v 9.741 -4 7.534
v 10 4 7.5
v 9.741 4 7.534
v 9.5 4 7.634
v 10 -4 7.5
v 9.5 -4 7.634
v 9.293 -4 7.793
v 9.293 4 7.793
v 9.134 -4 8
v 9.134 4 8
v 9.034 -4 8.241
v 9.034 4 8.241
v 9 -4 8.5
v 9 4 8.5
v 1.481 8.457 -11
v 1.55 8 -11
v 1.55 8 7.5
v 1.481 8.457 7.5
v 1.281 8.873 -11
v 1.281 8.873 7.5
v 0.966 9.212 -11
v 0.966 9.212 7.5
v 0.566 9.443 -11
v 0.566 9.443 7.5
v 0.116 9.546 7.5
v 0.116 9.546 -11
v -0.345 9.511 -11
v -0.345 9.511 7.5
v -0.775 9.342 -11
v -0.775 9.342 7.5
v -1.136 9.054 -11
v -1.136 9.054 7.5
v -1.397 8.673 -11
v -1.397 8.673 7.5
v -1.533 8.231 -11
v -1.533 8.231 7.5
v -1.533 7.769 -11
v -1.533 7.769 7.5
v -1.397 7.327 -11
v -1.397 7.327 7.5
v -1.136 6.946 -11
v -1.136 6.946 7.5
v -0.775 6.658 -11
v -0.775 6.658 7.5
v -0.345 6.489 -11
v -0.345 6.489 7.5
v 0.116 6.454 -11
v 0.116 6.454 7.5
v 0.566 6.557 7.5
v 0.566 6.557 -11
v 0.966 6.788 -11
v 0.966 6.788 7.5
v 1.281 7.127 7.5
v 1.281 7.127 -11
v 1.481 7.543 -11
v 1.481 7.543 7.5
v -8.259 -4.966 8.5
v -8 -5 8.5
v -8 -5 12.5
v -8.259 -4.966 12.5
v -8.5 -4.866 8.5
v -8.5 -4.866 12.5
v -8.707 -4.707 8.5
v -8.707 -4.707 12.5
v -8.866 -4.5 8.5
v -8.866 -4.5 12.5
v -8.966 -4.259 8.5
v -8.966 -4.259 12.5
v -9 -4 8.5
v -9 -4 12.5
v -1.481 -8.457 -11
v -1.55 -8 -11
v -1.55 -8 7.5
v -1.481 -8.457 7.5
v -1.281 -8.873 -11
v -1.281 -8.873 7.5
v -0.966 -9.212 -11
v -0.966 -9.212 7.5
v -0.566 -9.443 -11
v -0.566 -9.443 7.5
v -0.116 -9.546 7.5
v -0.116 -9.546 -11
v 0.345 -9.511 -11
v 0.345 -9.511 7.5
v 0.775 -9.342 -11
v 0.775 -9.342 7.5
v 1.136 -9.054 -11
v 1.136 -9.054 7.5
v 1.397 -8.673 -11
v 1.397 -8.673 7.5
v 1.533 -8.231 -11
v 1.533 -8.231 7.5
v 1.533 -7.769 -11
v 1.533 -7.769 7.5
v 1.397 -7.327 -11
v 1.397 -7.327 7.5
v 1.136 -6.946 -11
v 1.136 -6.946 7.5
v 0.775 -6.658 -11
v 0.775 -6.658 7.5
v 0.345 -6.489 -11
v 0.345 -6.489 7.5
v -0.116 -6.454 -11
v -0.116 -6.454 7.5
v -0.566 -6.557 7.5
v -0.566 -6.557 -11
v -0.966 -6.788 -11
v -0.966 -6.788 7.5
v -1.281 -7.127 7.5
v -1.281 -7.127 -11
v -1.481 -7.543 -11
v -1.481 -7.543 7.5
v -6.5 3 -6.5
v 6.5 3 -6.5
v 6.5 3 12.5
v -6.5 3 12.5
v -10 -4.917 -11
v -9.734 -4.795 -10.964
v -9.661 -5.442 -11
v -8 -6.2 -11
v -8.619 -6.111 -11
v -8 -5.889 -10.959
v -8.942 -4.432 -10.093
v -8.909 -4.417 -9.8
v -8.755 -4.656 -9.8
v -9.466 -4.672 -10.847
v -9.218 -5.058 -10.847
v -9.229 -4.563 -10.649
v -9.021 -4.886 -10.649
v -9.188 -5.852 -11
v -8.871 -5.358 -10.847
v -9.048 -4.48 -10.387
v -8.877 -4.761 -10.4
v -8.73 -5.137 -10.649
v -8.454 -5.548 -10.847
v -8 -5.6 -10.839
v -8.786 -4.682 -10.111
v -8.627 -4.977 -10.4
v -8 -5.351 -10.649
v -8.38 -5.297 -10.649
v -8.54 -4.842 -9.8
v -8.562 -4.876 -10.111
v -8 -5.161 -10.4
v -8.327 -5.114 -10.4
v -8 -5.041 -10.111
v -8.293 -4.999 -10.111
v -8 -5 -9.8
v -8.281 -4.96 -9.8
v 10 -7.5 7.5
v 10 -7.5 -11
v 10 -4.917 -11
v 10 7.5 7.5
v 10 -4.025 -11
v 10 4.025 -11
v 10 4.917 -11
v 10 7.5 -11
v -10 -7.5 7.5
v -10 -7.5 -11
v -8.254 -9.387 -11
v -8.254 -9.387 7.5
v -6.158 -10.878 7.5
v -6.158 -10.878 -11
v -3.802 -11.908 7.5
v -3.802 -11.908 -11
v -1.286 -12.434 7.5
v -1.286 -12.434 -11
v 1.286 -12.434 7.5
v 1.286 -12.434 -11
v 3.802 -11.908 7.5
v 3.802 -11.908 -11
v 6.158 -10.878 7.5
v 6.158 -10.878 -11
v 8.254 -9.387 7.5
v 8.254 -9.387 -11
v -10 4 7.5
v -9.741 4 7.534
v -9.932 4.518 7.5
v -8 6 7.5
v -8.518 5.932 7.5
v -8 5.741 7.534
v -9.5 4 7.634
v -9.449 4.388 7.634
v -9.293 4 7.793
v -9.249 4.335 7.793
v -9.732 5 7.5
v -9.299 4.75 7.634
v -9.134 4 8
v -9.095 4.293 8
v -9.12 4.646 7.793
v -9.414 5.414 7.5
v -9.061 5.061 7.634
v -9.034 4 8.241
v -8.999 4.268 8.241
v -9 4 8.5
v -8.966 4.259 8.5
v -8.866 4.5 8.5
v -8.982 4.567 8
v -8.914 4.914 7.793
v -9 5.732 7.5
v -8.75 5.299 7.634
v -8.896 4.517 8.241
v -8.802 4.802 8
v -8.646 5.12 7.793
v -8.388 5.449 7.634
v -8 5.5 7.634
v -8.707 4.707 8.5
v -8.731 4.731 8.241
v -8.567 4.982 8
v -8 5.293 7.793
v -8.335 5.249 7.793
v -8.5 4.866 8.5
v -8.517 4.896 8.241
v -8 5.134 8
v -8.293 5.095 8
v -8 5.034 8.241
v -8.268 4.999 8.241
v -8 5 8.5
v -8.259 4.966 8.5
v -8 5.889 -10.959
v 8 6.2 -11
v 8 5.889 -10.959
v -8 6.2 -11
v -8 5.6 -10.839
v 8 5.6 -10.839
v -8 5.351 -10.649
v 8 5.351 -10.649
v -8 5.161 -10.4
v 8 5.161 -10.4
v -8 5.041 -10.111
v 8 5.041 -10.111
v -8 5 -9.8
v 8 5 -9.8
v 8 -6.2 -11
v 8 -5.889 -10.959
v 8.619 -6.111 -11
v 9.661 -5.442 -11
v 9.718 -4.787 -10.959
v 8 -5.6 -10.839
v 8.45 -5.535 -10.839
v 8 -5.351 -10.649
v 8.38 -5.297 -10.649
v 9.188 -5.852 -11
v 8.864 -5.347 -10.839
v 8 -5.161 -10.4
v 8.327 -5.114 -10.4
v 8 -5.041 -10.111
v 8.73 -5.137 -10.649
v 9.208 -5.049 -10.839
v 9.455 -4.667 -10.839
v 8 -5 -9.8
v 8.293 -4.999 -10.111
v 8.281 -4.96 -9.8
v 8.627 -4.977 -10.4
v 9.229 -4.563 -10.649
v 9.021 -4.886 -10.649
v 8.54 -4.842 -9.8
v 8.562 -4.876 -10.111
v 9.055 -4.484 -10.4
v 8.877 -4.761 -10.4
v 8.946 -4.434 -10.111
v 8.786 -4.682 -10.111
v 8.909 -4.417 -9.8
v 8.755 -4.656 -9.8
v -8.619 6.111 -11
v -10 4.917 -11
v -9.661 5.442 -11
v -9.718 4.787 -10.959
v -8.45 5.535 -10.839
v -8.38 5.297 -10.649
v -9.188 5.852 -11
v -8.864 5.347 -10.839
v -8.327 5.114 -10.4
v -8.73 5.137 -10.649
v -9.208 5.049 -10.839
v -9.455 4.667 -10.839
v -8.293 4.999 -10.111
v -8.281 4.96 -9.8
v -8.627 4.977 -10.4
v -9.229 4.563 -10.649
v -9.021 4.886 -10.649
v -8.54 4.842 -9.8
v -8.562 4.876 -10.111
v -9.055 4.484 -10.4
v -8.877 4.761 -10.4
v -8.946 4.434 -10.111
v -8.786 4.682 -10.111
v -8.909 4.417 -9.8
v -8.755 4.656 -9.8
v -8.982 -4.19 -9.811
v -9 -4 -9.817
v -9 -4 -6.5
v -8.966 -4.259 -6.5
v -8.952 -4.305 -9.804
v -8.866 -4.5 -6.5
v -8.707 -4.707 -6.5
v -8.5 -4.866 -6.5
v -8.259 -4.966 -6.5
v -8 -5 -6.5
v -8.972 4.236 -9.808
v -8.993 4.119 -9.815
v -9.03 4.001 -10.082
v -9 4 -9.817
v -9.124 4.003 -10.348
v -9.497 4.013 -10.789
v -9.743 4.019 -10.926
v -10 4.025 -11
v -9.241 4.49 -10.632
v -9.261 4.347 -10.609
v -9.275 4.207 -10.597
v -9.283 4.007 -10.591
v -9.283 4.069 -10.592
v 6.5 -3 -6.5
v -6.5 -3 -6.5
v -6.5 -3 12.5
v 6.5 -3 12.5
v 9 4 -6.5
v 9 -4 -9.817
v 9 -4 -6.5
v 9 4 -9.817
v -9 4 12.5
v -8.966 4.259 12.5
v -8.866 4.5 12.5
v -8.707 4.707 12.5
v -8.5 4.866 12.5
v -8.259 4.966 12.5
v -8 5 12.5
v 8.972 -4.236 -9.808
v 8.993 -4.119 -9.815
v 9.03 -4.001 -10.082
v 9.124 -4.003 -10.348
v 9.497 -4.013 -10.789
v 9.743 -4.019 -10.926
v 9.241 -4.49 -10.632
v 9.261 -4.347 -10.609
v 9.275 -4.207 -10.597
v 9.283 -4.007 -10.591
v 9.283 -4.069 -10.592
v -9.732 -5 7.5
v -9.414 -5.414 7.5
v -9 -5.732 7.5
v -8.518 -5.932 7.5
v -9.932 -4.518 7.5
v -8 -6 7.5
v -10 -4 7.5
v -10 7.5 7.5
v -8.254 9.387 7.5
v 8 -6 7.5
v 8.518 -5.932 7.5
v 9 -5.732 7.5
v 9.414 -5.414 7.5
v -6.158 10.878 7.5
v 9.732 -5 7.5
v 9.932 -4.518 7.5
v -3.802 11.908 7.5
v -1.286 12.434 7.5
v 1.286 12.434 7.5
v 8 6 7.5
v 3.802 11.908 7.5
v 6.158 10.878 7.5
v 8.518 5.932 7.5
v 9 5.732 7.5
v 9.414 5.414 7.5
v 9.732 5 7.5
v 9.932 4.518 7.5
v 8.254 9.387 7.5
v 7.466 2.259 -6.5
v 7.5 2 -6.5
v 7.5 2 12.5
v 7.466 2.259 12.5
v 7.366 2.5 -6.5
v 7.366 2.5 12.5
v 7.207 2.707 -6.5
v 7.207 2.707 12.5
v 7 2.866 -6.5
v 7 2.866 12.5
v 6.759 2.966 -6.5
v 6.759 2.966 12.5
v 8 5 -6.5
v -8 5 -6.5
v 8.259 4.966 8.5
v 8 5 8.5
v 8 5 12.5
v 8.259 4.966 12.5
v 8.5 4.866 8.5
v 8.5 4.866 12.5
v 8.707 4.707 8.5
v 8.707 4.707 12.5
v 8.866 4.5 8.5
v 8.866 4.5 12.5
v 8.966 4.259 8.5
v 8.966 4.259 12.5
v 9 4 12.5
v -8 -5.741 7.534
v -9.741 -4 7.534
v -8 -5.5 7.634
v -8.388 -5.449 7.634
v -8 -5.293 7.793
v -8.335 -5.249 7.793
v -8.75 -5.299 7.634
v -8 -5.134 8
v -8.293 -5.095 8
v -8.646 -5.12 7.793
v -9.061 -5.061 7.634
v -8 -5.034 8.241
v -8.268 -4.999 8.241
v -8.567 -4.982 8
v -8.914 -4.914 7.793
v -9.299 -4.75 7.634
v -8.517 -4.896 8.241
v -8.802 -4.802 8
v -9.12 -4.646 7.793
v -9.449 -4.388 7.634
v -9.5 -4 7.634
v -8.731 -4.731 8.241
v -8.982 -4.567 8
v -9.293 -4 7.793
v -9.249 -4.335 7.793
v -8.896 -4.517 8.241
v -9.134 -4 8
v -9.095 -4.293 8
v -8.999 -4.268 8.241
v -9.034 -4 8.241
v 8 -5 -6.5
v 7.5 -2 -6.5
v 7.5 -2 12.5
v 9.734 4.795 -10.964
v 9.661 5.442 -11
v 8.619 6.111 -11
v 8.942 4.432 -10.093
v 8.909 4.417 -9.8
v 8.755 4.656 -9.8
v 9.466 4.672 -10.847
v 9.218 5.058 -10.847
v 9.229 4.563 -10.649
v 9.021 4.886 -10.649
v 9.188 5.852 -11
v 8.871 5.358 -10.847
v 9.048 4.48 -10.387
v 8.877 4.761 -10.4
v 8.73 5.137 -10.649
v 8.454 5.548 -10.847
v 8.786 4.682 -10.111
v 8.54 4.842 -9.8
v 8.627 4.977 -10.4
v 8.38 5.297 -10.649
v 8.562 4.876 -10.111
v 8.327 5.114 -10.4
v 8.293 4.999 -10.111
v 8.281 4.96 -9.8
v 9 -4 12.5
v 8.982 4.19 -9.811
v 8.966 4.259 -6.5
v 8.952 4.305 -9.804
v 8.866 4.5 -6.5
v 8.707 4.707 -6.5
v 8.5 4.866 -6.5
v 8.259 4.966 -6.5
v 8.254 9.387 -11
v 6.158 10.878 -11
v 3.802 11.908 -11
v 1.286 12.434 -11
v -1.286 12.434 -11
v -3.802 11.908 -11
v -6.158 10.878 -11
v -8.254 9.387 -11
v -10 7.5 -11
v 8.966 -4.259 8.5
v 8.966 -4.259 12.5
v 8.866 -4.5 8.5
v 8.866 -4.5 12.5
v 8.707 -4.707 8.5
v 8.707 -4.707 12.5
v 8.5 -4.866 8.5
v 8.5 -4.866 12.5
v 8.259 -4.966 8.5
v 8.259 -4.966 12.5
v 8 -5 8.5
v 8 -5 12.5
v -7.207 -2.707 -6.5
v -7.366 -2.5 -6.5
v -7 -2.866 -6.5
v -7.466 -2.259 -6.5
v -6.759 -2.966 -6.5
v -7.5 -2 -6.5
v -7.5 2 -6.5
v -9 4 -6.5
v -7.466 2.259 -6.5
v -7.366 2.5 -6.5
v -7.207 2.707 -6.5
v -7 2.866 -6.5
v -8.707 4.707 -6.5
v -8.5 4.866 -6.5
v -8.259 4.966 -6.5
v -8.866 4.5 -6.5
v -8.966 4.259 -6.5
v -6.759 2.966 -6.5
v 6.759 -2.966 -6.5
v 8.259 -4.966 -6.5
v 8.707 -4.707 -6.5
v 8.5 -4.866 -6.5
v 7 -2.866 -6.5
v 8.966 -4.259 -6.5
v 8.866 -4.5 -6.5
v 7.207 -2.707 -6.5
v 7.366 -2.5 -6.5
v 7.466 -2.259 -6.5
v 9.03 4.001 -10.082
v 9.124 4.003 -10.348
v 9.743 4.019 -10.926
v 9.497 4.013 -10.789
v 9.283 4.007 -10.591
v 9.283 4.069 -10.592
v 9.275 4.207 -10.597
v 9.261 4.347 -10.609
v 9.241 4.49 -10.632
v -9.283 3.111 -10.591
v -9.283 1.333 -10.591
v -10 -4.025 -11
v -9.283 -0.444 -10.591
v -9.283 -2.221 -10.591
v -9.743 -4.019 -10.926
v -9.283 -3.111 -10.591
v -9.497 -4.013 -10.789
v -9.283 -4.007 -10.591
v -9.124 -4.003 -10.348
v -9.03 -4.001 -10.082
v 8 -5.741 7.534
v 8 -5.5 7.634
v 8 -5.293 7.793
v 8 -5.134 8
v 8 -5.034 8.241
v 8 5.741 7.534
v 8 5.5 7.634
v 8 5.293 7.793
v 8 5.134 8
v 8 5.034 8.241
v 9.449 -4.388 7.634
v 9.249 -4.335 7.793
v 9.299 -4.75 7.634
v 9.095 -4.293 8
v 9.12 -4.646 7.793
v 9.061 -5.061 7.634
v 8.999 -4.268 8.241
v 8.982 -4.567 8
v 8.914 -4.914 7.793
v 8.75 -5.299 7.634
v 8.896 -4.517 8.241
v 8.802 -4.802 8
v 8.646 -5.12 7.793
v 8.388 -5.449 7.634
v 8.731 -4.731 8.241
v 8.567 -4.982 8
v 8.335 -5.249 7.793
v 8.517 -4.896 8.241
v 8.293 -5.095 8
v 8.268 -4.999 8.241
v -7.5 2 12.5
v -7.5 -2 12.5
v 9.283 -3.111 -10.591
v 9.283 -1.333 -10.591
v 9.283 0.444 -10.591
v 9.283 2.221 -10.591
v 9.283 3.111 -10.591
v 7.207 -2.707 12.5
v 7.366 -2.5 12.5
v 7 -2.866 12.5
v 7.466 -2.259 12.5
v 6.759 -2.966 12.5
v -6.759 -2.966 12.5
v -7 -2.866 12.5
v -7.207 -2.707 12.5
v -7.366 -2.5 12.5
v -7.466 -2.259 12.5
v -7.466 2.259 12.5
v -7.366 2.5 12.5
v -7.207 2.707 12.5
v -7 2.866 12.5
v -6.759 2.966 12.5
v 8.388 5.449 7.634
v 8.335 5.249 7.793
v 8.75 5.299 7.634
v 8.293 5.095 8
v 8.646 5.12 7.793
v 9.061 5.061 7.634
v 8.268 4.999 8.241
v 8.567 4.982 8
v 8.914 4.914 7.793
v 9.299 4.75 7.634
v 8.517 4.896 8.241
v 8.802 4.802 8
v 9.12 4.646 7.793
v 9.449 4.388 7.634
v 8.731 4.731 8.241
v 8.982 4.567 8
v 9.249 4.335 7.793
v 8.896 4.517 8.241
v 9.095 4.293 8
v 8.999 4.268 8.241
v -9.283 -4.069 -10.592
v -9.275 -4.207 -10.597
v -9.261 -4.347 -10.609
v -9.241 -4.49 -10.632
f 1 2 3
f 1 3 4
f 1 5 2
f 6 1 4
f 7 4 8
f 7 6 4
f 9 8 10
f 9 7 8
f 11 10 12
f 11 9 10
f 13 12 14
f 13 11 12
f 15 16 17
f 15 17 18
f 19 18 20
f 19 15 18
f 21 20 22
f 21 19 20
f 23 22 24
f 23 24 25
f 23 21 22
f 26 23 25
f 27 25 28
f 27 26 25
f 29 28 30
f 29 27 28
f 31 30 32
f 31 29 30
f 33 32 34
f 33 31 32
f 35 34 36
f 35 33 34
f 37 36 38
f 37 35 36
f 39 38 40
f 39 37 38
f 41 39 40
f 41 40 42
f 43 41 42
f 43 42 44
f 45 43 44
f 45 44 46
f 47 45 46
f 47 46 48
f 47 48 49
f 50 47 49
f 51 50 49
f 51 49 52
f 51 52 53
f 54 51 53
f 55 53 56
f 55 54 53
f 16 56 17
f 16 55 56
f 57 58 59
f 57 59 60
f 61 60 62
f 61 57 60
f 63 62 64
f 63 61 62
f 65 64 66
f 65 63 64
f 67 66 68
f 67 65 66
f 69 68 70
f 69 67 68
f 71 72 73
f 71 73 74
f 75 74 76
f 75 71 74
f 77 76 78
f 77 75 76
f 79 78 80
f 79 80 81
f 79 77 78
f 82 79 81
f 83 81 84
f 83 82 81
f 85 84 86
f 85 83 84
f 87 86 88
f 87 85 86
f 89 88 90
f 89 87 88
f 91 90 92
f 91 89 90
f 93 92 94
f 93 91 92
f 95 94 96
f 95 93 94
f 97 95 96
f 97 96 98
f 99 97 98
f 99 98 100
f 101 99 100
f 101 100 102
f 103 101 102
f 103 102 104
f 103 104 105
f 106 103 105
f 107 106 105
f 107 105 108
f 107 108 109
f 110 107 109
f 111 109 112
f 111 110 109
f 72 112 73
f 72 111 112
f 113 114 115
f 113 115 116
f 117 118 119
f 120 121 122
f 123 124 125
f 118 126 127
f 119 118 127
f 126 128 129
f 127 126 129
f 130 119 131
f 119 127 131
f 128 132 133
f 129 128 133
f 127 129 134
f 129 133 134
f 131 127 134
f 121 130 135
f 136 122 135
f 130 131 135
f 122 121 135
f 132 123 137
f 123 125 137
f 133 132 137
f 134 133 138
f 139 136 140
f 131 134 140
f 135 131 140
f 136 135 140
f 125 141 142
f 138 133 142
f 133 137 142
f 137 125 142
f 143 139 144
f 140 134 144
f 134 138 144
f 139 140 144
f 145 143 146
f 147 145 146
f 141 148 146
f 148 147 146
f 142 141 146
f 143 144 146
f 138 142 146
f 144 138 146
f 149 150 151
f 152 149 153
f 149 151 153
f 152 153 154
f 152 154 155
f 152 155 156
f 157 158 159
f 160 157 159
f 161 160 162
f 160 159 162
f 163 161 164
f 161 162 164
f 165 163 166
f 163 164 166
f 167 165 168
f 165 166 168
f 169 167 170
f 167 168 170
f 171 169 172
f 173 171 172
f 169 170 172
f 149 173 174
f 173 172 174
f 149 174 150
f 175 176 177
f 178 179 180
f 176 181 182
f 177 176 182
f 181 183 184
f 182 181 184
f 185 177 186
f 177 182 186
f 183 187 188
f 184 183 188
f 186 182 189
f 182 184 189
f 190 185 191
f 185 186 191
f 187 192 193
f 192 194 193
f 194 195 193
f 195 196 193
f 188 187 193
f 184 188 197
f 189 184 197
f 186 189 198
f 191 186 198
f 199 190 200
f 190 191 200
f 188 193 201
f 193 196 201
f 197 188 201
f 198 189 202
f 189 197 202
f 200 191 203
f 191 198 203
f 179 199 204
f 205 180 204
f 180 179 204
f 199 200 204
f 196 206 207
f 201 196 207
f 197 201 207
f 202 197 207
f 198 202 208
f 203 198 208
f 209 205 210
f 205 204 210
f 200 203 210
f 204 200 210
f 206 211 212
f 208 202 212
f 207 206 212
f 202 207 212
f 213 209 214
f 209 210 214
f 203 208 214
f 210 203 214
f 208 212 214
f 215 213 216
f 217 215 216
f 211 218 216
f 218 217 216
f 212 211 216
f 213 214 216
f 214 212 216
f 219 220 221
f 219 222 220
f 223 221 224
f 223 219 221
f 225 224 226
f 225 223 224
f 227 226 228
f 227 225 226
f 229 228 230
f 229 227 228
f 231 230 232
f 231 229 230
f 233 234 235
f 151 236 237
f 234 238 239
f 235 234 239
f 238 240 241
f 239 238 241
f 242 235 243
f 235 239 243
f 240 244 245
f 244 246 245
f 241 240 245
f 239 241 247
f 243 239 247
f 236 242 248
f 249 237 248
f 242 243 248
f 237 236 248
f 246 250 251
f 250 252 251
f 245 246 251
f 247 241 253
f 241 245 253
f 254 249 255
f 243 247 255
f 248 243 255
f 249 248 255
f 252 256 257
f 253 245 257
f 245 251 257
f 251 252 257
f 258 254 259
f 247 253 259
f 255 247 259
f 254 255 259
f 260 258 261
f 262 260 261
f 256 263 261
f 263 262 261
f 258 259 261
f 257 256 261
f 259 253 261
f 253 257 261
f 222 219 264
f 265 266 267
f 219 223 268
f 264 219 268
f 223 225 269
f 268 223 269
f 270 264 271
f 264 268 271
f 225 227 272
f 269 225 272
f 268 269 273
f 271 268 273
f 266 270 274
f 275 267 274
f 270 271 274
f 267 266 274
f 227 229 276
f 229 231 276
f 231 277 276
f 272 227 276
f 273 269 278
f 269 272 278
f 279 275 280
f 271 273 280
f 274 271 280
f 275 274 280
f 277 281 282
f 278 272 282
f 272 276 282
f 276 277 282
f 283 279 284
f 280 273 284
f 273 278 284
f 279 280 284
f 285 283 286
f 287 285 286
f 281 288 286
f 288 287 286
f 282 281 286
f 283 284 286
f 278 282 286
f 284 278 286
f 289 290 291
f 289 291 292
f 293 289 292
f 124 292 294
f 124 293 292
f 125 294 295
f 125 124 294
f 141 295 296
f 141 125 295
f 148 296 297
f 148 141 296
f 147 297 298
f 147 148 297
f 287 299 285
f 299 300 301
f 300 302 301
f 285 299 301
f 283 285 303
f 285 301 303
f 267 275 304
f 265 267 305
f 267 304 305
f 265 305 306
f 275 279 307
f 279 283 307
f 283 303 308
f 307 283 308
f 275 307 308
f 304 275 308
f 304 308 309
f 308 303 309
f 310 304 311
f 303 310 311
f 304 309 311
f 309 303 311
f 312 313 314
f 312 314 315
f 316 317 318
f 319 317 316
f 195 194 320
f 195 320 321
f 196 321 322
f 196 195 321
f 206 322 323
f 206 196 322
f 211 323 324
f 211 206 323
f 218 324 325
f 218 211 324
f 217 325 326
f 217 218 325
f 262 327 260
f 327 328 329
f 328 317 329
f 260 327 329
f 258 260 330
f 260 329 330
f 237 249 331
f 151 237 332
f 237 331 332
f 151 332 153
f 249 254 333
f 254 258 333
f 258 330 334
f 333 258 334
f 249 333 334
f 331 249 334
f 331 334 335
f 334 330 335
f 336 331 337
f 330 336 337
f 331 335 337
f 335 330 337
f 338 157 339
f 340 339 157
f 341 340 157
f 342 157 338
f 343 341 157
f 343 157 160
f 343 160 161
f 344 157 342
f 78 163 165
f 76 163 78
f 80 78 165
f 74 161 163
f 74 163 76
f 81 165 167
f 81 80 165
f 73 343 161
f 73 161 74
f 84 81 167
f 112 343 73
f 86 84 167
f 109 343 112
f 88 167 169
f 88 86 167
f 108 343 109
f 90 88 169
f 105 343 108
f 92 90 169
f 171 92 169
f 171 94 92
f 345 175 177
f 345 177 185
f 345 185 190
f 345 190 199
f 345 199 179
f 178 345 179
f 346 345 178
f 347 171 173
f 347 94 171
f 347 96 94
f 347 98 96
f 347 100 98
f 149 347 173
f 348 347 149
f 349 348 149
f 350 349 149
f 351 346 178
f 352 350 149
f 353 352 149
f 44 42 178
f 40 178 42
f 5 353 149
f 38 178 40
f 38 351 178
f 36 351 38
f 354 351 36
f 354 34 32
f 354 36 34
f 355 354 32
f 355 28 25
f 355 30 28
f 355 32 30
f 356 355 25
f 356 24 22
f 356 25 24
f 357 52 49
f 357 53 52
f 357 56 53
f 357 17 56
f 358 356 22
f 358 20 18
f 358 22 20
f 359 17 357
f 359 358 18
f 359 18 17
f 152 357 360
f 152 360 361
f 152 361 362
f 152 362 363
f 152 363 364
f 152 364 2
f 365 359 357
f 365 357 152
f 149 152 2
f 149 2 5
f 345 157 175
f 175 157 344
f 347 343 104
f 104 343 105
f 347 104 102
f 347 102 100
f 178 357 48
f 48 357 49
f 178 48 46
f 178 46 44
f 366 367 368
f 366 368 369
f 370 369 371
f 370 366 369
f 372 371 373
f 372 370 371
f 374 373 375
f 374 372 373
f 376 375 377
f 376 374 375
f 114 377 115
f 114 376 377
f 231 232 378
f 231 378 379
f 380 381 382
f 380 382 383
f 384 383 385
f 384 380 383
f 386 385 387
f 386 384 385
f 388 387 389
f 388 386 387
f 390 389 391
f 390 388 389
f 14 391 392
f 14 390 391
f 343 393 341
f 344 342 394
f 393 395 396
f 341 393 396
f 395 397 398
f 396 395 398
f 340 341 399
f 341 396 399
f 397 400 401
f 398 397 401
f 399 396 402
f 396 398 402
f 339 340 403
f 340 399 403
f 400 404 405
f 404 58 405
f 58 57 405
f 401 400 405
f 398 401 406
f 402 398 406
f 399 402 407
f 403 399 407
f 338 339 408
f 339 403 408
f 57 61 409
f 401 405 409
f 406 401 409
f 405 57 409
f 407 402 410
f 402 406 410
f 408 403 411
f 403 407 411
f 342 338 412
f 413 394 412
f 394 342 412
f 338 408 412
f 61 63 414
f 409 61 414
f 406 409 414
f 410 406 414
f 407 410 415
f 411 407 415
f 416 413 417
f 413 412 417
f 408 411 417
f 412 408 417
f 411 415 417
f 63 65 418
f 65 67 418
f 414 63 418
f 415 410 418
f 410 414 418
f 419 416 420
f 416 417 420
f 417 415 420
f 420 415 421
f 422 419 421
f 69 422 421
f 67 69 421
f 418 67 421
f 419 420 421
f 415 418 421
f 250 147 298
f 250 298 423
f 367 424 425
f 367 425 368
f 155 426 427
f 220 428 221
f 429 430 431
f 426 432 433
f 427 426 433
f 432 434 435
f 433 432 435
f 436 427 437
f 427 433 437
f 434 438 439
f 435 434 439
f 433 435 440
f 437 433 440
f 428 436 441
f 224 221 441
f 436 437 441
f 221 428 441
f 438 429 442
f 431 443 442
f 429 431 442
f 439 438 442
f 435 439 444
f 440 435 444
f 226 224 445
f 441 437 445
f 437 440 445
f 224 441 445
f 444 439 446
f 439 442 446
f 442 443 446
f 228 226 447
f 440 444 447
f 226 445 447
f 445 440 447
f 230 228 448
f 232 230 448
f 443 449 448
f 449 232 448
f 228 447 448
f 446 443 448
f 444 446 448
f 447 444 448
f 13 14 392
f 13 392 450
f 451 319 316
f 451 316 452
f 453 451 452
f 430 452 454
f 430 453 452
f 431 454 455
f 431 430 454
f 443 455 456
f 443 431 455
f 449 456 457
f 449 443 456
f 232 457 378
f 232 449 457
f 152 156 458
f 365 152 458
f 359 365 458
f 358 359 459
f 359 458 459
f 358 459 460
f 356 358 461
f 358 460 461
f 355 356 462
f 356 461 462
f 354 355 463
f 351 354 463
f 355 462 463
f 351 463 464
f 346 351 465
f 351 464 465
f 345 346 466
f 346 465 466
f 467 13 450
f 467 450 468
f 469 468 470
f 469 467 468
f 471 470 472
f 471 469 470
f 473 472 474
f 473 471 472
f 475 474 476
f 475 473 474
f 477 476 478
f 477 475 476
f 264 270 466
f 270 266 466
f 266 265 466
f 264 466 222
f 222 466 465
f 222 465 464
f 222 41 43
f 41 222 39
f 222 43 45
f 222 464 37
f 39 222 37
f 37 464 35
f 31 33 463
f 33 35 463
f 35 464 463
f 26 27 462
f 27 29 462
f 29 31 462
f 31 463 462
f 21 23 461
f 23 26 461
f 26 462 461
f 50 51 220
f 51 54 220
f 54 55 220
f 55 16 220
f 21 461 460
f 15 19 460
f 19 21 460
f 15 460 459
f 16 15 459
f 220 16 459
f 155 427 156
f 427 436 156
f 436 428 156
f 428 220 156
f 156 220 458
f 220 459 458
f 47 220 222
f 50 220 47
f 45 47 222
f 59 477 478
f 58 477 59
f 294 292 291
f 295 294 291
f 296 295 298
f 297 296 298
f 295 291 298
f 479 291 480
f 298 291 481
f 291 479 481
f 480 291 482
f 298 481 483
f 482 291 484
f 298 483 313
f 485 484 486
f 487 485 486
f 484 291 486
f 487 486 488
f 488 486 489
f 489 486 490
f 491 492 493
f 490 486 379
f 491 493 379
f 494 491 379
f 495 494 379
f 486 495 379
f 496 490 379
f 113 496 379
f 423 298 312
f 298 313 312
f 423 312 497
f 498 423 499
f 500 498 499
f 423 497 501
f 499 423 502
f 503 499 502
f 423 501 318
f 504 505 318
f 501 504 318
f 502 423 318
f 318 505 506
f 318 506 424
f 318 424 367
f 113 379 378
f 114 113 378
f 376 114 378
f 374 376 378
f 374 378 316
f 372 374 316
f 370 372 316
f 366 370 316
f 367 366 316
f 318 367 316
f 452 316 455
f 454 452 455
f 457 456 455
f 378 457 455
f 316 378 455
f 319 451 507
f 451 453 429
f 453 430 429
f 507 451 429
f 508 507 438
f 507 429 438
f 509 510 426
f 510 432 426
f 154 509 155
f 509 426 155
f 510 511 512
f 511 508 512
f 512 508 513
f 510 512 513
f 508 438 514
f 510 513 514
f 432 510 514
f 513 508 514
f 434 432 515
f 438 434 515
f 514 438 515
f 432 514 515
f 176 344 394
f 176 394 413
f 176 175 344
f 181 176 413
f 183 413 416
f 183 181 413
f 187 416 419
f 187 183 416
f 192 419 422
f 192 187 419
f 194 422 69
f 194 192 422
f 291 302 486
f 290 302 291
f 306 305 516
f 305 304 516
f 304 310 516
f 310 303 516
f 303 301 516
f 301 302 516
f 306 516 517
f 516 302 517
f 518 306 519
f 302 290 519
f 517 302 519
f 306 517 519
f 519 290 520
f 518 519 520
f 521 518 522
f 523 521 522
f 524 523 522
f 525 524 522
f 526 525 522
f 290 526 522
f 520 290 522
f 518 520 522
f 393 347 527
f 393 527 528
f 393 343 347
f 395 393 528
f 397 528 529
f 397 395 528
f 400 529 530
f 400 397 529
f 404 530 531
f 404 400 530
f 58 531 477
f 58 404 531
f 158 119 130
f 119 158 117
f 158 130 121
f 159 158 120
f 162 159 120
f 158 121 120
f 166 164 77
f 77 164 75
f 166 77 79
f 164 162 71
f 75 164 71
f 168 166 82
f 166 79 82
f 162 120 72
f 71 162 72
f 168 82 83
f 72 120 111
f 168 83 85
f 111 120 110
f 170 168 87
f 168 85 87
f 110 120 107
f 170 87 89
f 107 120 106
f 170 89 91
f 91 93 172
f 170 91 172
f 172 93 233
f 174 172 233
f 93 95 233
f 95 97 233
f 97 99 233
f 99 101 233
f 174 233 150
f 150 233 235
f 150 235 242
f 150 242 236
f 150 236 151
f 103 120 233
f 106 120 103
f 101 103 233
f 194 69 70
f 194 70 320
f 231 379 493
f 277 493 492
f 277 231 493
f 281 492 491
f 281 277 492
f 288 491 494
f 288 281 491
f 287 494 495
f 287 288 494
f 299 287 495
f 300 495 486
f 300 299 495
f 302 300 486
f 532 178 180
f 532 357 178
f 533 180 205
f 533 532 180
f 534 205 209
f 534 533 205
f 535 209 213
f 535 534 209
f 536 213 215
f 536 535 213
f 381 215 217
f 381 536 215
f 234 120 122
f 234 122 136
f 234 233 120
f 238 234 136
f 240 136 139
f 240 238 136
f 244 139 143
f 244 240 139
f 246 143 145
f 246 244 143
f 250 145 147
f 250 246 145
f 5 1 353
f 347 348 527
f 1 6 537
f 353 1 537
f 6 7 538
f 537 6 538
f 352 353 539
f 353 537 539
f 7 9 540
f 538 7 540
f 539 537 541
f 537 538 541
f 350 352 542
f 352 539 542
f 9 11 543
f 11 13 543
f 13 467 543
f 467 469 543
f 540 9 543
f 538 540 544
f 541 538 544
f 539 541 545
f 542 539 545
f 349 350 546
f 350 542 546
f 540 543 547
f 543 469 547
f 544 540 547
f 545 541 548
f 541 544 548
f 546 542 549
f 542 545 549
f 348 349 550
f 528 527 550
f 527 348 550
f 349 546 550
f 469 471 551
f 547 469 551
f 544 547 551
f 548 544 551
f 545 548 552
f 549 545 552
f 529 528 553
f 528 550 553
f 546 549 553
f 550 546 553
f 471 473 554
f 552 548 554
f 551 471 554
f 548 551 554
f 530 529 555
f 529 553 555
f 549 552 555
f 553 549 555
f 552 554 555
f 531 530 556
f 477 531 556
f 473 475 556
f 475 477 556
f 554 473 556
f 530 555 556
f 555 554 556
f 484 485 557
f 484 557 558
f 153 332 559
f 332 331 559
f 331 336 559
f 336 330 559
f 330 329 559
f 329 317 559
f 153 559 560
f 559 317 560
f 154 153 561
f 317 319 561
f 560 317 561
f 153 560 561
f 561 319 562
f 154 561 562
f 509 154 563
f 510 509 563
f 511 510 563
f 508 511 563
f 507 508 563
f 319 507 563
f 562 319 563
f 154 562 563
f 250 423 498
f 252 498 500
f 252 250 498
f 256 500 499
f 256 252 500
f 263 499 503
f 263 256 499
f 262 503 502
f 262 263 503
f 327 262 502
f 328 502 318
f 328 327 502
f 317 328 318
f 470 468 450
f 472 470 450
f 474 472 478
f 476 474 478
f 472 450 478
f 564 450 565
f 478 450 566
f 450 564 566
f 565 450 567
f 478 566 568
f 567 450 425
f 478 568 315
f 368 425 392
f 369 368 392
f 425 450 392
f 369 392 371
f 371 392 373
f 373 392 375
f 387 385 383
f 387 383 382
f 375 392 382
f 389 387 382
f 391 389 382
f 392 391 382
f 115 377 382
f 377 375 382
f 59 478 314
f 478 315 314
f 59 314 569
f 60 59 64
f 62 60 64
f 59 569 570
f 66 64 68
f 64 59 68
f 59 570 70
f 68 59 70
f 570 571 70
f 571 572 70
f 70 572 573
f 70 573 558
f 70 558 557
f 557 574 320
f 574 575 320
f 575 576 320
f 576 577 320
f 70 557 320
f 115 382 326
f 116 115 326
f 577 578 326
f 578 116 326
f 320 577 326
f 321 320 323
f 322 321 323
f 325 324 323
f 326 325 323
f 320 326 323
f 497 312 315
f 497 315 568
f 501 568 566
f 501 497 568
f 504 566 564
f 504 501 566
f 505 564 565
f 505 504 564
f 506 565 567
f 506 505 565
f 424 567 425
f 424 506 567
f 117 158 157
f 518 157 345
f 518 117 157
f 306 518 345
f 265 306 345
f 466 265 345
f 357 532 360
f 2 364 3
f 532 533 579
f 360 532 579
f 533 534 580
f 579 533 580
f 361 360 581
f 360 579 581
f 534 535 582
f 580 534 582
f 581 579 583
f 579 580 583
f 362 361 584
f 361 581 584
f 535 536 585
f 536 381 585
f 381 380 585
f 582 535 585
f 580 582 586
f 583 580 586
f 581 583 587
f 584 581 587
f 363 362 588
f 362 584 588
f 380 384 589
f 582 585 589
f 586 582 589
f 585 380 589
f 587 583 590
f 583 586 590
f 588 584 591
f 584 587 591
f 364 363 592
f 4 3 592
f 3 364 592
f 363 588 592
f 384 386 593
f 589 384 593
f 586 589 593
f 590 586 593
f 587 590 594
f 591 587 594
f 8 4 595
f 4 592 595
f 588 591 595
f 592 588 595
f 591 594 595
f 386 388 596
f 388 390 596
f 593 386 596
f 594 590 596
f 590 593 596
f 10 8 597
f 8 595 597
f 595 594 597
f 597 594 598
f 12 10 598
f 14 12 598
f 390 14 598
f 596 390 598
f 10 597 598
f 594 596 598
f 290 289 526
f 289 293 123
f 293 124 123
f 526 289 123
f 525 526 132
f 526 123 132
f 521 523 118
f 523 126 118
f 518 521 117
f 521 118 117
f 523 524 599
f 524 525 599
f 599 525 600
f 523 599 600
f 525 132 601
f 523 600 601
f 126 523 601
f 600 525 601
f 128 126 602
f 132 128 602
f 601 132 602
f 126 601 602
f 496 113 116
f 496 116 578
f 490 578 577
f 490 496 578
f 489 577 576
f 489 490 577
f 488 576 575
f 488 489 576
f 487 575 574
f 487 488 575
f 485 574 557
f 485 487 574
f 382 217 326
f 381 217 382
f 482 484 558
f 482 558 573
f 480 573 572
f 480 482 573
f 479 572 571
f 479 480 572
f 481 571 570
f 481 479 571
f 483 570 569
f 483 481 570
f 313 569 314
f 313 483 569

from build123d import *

# Parameters (mm, degrees)
AUFSATZ_LINEAR_AUSTRAGEN1_DEPTH      = 7.5
AUFSATZ_LINEAR_AUSTRAGEN1_DEPTH_BACK = 11
SKIZZE1_R                            = 12.5
SKIZZE1_R_2                          = 1.55
SCHNITT_LINEAR_AUSTRAGEN1_DEPTH      = 4.5
AUFSATZ_LINEAR_AUSTRAGEN2_DEPTH      = 5
SCHNITT_LINEAR_AUSTRAGEN4_DEPTH      = 22.650635095
SCHNITT_LINEAR_AUSTRAGEN4_DEPTH_BACK = 22.650635095
SCHNITT_LINEAR_AUSTRAGEN5_DEPTH      = 10
SCHNITT_LINEAR_AUSTRAGEN5_DEPTH_BACK = 22.650635095
SKIZZE5_OUTSIDE_W                    = 35.49
SKIZZE5_OUTSIDE_H                    = 35.49
SKIZZE5_OUTSIDE_W_2                  = 20
SKIZZE5_OUTSIDE_H_2                  = 30
VERRUNDUNG1_R                        = 1.2
VERRUNDUNG2_R                        = 1


with BuildPart() as part:
    # Skizze1 → Aufsatz-Linear austragen1 (new, two sides: drawn at the far end of the back side and taken through both)
    with BuildSketch(Plane.XY.offset(-AUFSATZ_LINEAR_AUSTRAGEN1_DEPTH_BACK)):
        Circle(SKIZZE1_R)
        with Locations((0, 8)):
            Circle(SKIZZE1_R_2, mode=Mode.SUBTRACT)
        with Locations(Location((0, -8, 0), (0, 0, 180))):
            Circle(SKIZZE1_R_2, mode=Mode.SUBTRACT)
    extrude(amount=AUFSATZ_LINEAR_AUSTRAGEN1_DEPTH + AUFSATZ_LINEAR_AUSTRAGEN1_DEPTH_BACK)

    # Skizze2 → Schnitt-Linear austragen1 (cut)
    with BuildSketch(Plane(origin=(0, 0, -11), x_dir=(-1, 0, 0), z_dir=(0, 0, -1))):
        with BuildLine():
            Line((-9, -4), (-9, 4))
            ThreePointArc((-9, 4), (-8.707106781, 4.707106781), (-8, 5))
            Line((-8, 5), (8, 5))
            ThreePointArc((8, 5), (8.707106781, 4.707106781), (9, 4))
            Line((9, 4), (9, -4))
            ThreePointArc((9, -4), (8.707106781, -4.707106781), (8, -5))
            Line((8, -5), (-8, -5))
            ThreePointArc((-8, -5), (-8.707106781, -4.707106781), (-9, -4))
        make_face()
    extrude(amount=-SCHNITT_LINEAR_AUSTRAGEN1_DEPTH, mode=Mode.SUBTRACT)

    # Skizze3 → Aufsatz-Linear austragen2 (add)
    with BuildSketch(Plane.XY.offset(7.5)):
        with BuildLine():
            Line((-8, 5), (8, 5))
            ThreePointArc((8, 5), (8.707106781, 4.707106781), (9, 4))
            Line((9, 4), (9, -4))
            ThreePointArc((9, -4), (8.707106781, -4.707106781), (8, -5))
            Line((8, -5), (-8, -5))
            ThreePointArc((-8, -5), (-8.707106781, -4.707106781), (-9, -4))
            Line((-9, -4), (-9, 4))
            ThreePointArc((-9, 4), (-8.707106781, 4.707106781), (-8, 5))
        make_face()
    extrude(amount=AUFSATZ_LINEAR_AUSTRAGEN2_DEPTH)

    # Skizze4 → Schnitt-Linear austragen4 (cut, two sides: drawn at the far end of the back side and taken through both)
    with BuildSketch(Plane.XY.offset(-SCHNITT_LINEAR_AUSTRAGEN4_DEPTH_BACK)):
        with BuildLine():
            Line((-6.5, -3), (6.5, -3))
            ThreePointArc((6.5, -3), (7.207106781, -2.707106781), (7.5, -2))
            Line((7.5, -2), (7.5, 2))
            ThreePointArc((7.5, 2), (7.207106781, 2.707106781), (6.5, 3))
            Line((6.5, 3), (-6.5, 3))
            ThreePointArc((-6.5, 3), (-7.207106781, 2.707106781), (-7.5, 2))
            Line((-7.5, 2), (-7.5, -2))
            ThreePointArc((-7.5, -2), (-7.207106781, -2.707106781), (-6.5, -3))
        make_face()
    extrude(amount=SCHNITT_LINEAR_AUSTRAGEN4_DEPTH + SCHNITT_LINEAR_AUSTRAGEN4_DEPTH_BACK, mode=Mode.SUBTRACT)

    # Skizze5 outside → Schnitt-Linear austragen5 (cut, two sides: drawn at the far end of the back side and taken through both)
    with BuildSketch(Plane.XY.offset(-SCHNITT_LINEAR_AUSTRAGEN5_DEPTH_BACK)):
        Rectangle(SKIZZE5_OUTSIDE_W, SKIZZE5_OUTSIDE_H)
        Rectangle(SKIZZE5_OUTSIDE_W_2, SKIZZE5_OUTSIDE_H_2, mode=Mode.SUBTRACT)
    extrude(amount=SCHNITT_LINEAR_AUSTRAGEN5_DEPTH + SCHNITT_LINEAR_AUSTRAGEN5_DEPTH_BACK, mode=Mode.SUBTRACT)

    # Verrundung1
    verrundung1_edges = [part.edges().sort_by_distance(p)[0] for p in [
        (-8.707106781, 4.707106781, -11),
        (-8.707106781, -4.707106781, -11),
        (0, -5, -11),
        (8.707106781, -4.707106781, -11),
        (8.707106781, 4.707106781, -11),
        (0, 5, -11),
    ]]
    fillet(verrundung1_edges, radius=VERRUNDUNG1_R)

    # Verrundung2
    verrundung2_edges = [part.edges().sort_by_distance(p)[0] for p in [
        (8.707106781, 4.707106781, 7.5),
        (0, 5, 7.5),
        (-8.707106781, 4.707106781, 7.5),
        (-9, 0, 7.5),
        (-8.707106781, -4.707106781, 7.5),
        (0, -5, 7.5),
        (8.707106781, -4.707106781, 7.5),
        (9, 0, 7.5),
    ]]
    fillet(verrundung2_edges, radius=VERRUNDUNG2_R - 0.0001)  # a hair under: the kernel refuses the full size


solid = part.part
